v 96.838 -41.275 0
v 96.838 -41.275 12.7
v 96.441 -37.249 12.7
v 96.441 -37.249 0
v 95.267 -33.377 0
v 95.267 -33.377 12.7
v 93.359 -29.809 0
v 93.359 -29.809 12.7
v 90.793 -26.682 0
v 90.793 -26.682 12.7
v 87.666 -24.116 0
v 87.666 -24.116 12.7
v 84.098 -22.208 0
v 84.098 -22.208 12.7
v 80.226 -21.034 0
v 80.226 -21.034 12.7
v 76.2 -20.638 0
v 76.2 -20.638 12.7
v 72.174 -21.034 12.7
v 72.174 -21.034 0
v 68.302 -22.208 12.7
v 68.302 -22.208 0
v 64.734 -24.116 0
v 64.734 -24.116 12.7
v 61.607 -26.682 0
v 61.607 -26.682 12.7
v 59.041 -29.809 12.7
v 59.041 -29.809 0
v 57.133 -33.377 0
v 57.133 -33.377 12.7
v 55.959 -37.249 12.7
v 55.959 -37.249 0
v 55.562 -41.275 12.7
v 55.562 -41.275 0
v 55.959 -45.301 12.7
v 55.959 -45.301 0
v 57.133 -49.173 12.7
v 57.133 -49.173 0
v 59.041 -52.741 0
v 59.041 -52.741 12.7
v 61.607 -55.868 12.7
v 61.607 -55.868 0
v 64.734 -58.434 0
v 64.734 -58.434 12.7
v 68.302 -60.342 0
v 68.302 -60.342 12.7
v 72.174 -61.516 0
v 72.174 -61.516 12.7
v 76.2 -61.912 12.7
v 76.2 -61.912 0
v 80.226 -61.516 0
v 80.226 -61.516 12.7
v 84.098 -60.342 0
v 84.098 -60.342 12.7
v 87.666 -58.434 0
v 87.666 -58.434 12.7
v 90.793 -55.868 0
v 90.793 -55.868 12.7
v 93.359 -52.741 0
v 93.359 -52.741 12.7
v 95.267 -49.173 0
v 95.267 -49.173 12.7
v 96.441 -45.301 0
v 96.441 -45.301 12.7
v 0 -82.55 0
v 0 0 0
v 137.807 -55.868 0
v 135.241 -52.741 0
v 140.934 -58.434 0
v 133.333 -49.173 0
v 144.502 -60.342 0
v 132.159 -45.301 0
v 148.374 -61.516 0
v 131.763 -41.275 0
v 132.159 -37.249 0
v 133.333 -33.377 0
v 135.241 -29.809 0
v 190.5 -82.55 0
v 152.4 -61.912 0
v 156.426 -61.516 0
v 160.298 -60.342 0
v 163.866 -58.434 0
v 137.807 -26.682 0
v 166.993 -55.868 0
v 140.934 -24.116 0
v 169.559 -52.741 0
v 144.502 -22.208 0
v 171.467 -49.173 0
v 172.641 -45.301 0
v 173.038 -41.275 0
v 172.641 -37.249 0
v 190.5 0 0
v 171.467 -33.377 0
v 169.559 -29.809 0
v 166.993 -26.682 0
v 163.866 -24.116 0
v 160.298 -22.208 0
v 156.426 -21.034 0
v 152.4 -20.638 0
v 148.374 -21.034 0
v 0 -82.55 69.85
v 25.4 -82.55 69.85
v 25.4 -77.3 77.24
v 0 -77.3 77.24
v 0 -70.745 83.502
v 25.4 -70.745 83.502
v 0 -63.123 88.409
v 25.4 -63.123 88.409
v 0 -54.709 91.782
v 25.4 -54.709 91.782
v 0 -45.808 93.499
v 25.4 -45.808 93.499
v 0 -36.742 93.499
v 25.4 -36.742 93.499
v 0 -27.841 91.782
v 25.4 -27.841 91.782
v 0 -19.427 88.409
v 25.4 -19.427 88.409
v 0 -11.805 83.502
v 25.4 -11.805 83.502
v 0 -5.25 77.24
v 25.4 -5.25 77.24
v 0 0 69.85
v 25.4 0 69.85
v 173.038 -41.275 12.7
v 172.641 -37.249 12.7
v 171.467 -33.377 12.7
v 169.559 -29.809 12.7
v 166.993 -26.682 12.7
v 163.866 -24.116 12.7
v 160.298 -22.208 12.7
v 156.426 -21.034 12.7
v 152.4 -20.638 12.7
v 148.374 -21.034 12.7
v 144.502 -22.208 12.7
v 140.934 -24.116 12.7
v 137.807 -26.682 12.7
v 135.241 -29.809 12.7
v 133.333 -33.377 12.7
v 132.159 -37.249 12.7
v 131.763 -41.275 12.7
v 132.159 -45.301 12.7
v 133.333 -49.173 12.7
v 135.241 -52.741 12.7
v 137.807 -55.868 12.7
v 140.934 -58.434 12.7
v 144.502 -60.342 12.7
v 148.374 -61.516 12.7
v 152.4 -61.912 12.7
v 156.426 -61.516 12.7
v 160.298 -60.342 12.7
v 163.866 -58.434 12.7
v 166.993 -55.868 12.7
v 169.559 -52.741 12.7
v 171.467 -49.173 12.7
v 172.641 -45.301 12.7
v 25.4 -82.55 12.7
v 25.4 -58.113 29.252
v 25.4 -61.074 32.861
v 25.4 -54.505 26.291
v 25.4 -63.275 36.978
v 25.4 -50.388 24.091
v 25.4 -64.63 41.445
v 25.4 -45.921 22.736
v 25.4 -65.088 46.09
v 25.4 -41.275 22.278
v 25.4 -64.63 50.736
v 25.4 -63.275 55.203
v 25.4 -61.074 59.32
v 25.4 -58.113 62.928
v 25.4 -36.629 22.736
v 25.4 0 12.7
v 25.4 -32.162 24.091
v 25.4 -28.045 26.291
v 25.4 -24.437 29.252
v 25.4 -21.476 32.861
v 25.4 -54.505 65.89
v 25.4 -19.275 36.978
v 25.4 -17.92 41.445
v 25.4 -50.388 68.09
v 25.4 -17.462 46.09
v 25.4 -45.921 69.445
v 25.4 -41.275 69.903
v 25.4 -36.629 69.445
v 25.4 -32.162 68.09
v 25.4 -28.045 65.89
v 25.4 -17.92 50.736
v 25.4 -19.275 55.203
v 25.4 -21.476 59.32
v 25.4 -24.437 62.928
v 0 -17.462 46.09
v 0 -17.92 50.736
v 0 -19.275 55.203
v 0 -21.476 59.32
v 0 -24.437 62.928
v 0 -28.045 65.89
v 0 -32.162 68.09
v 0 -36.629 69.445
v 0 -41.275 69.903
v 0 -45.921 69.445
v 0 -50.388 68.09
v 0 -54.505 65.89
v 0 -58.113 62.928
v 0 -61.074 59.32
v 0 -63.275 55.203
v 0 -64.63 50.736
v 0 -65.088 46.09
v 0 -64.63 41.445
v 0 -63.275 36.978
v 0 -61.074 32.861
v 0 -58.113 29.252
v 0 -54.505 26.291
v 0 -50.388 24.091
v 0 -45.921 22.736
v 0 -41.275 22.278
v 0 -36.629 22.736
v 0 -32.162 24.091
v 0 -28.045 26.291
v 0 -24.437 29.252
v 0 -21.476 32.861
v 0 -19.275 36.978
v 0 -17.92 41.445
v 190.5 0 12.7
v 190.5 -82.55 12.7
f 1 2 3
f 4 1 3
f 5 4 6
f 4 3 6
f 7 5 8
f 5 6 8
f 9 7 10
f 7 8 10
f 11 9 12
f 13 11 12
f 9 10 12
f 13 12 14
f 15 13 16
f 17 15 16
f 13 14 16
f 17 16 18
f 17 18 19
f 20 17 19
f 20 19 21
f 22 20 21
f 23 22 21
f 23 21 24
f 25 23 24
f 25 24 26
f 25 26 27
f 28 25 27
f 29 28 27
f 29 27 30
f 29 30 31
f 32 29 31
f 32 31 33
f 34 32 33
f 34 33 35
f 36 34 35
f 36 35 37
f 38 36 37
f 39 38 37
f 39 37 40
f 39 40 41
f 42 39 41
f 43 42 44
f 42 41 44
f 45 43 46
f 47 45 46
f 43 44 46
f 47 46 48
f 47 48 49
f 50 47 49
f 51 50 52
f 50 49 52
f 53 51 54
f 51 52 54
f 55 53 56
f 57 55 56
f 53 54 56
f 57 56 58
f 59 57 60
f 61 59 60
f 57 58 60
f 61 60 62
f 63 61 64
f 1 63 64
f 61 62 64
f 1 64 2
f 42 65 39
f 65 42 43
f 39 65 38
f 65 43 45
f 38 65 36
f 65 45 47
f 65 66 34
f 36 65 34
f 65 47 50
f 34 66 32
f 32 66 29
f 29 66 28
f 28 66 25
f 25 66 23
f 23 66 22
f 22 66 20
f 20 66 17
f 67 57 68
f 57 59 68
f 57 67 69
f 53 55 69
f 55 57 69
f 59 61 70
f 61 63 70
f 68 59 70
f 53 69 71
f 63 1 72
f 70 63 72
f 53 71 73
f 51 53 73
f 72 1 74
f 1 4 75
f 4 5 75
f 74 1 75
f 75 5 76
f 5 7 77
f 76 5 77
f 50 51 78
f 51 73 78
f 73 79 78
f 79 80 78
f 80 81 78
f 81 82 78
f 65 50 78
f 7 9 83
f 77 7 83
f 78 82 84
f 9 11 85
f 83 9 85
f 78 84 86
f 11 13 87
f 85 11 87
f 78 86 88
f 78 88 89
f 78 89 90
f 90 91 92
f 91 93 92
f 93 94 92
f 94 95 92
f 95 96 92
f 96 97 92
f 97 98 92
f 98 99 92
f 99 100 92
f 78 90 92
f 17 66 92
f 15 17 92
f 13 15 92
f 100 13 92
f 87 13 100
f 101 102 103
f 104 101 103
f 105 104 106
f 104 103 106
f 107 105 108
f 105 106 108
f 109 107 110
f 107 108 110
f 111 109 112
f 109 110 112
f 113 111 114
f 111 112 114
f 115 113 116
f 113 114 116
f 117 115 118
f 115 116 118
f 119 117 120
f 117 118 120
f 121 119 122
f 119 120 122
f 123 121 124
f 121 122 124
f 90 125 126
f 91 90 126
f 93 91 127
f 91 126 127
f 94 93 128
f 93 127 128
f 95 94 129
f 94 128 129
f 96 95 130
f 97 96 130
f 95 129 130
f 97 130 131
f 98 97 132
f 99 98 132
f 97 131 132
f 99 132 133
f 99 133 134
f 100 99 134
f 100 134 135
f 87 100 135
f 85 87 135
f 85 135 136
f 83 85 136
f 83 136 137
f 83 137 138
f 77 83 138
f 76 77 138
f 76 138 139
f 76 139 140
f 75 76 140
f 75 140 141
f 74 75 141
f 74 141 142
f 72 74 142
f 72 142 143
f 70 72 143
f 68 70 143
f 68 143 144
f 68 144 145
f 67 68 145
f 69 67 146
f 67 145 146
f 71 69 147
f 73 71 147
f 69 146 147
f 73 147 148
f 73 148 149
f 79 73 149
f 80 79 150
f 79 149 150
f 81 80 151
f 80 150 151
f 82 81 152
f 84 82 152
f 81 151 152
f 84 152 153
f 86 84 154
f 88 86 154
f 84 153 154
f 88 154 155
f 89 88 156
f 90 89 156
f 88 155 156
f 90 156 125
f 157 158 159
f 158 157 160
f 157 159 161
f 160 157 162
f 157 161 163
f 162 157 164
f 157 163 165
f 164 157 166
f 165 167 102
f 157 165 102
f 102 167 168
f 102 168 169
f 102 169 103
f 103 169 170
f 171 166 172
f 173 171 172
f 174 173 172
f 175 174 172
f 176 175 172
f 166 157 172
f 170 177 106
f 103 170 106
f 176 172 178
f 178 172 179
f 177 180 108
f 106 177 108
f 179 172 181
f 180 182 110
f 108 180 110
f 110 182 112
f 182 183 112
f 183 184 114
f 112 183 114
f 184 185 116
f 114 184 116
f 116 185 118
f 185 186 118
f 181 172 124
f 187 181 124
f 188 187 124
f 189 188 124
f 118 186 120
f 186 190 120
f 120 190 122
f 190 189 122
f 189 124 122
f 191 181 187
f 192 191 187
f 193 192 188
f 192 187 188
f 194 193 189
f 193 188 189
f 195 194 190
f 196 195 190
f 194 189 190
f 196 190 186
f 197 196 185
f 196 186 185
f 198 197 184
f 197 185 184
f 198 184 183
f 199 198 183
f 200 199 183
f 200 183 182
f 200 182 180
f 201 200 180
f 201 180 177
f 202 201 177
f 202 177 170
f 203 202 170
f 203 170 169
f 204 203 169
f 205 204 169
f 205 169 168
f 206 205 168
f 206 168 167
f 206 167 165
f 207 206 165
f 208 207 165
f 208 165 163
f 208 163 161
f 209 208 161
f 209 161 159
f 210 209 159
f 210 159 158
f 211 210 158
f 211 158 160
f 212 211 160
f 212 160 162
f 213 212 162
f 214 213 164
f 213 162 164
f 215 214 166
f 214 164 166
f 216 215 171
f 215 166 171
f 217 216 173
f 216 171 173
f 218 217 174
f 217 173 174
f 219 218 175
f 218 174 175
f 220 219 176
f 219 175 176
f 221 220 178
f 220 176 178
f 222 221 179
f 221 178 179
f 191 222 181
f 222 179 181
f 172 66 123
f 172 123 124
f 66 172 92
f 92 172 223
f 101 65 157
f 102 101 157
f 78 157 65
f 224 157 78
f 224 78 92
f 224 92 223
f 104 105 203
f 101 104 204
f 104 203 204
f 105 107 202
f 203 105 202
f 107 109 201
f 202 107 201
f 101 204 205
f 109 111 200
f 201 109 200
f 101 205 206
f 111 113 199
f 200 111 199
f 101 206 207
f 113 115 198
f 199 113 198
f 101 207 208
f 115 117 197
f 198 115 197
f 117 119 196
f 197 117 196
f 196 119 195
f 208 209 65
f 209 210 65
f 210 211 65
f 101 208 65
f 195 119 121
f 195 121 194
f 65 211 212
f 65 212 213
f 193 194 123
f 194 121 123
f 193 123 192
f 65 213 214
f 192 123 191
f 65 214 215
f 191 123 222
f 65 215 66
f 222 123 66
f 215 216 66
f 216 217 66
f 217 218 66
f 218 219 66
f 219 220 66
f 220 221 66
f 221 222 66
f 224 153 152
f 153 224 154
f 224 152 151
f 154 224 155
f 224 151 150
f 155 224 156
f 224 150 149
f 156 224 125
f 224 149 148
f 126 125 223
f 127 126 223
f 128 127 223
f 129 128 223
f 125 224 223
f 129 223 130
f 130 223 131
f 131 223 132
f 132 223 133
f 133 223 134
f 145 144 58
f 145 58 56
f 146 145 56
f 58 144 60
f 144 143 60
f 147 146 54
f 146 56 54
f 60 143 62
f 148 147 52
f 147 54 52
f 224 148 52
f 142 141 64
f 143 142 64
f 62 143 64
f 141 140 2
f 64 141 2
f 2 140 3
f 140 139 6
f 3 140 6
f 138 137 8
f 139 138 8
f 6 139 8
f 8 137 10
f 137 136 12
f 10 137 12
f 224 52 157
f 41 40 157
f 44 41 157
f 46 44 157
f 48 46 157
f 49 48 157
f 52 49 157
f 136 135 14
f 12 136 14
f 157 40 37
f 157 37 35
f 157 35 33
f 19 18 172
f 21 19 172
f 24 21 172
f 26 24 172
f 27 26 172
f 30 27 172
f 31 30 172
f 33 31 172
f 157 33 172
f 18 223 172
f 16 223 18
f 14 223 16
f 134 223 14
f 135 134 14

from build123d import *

# Parameters (mm, degrees)
F1_DEPTH = 82.55
F2_R     = 20.6375
F3_DEPTH = 12.701
F5_DEPTH = 25.401
F6_R     = 23.8125
F7_DEPTH = 25.401


with BuildPart() as f1:
    # F0 (on Front) → F1 (new body)
    with BuildSketch(Plane.XZ):
        Polygon((0, 101.6), (0, 0), (190.5, 0), (190.5, 12.7), (25.4, 12.7), (25.4, 101.6), align=None)
    extrude(amount=F1_DEPTH)

    # F2 (on face) → F3 (cut, through all)
    with BuildSketch(Plane.XY.offset(12.7)):
        with Locations((76.2, -41.275)):
            Circle(F2_R)
        with Locations((152.4, -41.275)):
            Circle(F2_R)
    extrude(amount=-F3_DEPTH, mode=Mode.SUBTRACT)

    # F4 (on face) → F5 (cut, through all)
    with BuildSketch(Plane.YZ.offset(25.4)):
        with BuildLine():
            Line((-82.55, 101.6), (-82.55, 69.85))
            ThreePointArc((-82.55, 69.85), (-41.275, 93.715476), (0, 69.85))
            Line((0, 69.85), (0, 101.6))
            Line((0, 101.6), (-82.55, 101.6))
        make_face()
    extrude(amount=-F5_DEPTH, mode=Mode.SUBTRACT)

    # F6 (on face) → F7 (cut, through all)
    with BuildSketch(Plane.YZ.offset(25.4)):
        with Locations((-41.275, 46.090476)):
            Circle(F6_R)
    extrude(amount=-F7_DEPTH, mode=Mode.SUBTRACT)


solid = f1.part
